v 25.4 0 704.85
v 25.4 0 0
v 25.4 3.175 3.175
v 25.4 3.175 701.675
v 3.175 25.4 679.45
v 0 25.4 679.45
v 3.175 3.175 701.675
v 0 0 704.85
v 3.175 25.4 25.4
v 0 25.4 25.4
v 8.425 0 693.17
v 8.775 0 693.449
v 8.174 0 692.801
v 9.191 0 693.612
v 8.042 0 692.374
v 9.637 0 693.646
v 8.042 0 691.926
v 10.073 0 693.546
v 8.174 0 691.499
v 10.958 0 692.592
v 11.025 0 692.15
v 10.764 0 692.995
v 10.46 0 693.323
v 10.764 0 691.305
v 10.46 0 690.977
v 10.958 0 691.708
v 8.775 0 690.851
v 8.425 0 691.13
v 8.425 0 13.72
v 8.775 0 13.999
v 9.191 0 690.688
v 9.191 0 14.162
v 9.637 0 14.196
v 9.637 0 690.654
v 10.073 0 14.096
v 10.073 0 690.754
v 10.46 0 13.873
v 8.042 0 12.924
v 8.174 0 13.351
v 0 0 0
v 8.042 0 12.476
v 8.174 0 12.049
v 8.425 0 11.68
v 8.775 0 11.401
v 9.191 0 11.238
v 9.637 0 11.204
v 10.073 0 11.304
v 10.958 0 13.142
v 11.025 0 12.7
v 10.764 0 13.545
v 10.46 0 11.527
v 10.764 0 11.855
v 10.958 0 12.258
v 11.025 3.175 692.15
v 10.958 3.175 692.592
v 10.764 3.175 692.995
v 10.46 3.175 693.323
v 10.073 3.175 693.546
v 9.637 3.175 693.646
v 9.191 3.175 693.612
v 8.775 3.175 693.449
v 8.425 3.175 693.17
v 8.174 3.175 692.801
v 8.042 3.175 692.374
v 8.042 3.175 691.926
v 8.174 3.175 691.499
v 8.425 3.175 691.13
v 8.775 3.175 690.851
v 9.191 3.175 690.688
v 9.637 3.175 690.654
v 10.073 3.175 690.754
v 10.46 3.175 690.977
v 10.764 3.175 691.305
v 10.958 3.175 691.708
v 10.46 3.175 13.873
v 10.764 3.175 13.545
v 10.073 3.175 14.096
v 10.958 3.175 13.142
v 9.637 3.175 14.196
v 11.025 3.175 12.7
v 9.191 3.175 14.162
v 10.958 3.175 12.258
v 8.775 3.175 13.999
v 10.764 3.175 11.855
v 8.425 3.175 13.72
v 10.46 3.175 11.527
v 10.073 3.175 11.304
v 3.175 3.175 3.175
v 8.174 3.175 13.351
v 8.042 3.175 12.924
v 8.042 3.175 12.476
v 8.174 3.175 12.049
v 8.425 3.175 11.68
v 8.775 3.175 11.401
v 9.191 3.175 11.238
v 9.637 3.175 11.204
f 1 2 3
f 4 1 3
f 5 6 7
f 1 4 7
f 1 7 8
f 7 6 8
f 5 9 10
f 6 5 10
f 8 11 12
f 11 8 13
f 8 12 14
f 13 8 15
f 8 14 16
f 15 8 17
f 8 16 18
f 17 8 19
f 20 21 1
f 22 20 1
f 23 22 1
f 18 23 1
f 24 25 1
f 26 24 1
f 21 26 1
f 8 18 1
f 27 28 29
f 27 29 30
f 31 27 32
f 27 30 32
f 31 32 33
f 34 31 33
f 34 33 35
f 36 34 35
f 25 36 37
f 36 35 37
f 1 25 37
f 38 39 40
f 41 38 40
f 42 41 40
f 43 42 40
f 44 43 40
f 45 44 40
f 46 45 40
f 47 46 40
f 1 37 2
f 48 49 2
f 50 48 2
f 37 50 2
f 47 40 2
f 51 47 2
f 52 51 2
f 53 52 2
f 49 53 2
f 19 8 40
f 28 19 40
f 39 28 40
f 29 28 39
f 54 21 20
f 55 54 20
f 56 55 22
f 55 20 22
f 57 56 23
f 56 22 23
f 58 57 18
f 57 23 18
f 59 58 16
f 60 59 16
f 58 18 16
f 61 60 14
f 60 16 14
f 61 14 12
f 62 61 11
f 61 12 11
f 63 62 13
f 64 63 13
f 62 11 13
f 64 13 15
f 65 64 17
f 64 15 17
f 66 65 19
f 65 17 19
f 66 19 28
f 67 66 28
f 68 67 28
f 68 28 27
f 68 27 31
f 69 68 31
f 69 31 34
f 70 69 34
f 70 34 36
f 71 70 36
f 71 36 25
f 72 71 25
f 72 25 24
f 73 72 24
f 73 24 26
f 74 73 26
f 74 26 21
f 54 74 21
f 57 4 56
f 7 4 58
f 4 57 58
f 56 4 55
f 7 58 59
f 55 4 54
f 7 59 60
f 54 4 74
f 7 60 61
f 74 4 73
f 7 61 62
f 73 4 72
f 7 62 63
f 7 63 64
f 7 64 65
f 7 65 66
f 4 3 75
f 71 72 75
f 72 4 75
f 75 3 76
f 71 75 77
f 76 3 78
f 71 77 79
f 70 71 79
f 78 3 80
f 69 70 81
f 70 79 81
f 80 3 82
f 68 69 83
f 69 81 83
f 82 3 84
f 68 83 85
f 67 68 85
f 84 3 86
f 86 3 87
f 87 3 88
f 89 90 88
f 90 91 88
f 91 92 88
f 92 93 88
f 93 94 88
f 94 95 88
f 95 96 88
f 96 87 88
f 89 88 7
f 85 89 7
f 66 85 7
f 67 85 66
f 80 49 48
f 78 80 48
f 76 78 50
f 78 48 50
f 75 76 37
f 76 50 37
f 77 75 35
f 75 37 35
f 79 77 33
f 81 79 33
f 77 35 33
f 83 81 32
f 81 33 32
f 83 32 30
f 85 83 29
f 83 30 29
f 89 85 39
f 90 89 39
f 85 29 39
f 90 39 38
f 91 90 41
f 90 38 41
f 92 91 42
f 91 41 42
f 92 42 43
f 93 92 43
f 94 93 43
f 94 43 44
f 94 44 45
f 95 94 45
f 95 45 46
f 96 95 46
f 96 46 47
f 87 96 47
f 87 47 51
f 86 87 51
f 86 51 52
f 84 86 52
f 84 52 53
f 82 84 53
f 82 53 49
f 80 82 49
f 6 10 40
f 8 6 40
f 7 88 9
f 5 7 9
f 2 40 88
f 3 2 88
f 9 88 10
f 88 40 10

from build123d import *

# Parameters (mm, degrees)
BOSS_EXTRUDE1_DEPTH = 704.85
CUT_EXTRUDE1_DEPTH  = 711.2
SKETCH3_R           = 1.5
CUT_EXTRUDE2_DEPTH  = 711.2


with BuildPart() as part:
    # Sketch1 → Boss-Extrude1 (new body)
    with BuildSketch(Plane.XY):
        Polygon((0, 25.4), (0, 0), (25.4, 0), (25.4, 3.175), (3.175, 3.175), (3.175, 25.4), align=None)
    extrude(amount=BOSS_EXTRUDE1_DEPTH)

    # Sketch2 → Cut-Extrude1 (cut)
    with BuildSketch(Plane.ZY):
        Polygon((0, 8.542079309), (0, 0), (25.4, 25.4), (0, 25.4), align=None)
        Polygon((704.85, 25.4), (679.45, 25.4), (704.85, 0), align=None)
    extrude(amount=-CUT_EXTRUDE1_DEPTH, mode=Mode.SUBTRACT)

    # Sketch3 → Cut-Extrude2 (cut)
    with BuildSketch(Plane.XZ):
        with Locations((9.525, 692.15)):
            Circle(SKETCH3_R)
        with Locations((9.525, 12.7)):
            Circle(SKETCH3_R)
    extrude(amount=-CUT_EXTRUDE2_DEPTH, mode=Mode.SUBTRACT)


solid = part.part
